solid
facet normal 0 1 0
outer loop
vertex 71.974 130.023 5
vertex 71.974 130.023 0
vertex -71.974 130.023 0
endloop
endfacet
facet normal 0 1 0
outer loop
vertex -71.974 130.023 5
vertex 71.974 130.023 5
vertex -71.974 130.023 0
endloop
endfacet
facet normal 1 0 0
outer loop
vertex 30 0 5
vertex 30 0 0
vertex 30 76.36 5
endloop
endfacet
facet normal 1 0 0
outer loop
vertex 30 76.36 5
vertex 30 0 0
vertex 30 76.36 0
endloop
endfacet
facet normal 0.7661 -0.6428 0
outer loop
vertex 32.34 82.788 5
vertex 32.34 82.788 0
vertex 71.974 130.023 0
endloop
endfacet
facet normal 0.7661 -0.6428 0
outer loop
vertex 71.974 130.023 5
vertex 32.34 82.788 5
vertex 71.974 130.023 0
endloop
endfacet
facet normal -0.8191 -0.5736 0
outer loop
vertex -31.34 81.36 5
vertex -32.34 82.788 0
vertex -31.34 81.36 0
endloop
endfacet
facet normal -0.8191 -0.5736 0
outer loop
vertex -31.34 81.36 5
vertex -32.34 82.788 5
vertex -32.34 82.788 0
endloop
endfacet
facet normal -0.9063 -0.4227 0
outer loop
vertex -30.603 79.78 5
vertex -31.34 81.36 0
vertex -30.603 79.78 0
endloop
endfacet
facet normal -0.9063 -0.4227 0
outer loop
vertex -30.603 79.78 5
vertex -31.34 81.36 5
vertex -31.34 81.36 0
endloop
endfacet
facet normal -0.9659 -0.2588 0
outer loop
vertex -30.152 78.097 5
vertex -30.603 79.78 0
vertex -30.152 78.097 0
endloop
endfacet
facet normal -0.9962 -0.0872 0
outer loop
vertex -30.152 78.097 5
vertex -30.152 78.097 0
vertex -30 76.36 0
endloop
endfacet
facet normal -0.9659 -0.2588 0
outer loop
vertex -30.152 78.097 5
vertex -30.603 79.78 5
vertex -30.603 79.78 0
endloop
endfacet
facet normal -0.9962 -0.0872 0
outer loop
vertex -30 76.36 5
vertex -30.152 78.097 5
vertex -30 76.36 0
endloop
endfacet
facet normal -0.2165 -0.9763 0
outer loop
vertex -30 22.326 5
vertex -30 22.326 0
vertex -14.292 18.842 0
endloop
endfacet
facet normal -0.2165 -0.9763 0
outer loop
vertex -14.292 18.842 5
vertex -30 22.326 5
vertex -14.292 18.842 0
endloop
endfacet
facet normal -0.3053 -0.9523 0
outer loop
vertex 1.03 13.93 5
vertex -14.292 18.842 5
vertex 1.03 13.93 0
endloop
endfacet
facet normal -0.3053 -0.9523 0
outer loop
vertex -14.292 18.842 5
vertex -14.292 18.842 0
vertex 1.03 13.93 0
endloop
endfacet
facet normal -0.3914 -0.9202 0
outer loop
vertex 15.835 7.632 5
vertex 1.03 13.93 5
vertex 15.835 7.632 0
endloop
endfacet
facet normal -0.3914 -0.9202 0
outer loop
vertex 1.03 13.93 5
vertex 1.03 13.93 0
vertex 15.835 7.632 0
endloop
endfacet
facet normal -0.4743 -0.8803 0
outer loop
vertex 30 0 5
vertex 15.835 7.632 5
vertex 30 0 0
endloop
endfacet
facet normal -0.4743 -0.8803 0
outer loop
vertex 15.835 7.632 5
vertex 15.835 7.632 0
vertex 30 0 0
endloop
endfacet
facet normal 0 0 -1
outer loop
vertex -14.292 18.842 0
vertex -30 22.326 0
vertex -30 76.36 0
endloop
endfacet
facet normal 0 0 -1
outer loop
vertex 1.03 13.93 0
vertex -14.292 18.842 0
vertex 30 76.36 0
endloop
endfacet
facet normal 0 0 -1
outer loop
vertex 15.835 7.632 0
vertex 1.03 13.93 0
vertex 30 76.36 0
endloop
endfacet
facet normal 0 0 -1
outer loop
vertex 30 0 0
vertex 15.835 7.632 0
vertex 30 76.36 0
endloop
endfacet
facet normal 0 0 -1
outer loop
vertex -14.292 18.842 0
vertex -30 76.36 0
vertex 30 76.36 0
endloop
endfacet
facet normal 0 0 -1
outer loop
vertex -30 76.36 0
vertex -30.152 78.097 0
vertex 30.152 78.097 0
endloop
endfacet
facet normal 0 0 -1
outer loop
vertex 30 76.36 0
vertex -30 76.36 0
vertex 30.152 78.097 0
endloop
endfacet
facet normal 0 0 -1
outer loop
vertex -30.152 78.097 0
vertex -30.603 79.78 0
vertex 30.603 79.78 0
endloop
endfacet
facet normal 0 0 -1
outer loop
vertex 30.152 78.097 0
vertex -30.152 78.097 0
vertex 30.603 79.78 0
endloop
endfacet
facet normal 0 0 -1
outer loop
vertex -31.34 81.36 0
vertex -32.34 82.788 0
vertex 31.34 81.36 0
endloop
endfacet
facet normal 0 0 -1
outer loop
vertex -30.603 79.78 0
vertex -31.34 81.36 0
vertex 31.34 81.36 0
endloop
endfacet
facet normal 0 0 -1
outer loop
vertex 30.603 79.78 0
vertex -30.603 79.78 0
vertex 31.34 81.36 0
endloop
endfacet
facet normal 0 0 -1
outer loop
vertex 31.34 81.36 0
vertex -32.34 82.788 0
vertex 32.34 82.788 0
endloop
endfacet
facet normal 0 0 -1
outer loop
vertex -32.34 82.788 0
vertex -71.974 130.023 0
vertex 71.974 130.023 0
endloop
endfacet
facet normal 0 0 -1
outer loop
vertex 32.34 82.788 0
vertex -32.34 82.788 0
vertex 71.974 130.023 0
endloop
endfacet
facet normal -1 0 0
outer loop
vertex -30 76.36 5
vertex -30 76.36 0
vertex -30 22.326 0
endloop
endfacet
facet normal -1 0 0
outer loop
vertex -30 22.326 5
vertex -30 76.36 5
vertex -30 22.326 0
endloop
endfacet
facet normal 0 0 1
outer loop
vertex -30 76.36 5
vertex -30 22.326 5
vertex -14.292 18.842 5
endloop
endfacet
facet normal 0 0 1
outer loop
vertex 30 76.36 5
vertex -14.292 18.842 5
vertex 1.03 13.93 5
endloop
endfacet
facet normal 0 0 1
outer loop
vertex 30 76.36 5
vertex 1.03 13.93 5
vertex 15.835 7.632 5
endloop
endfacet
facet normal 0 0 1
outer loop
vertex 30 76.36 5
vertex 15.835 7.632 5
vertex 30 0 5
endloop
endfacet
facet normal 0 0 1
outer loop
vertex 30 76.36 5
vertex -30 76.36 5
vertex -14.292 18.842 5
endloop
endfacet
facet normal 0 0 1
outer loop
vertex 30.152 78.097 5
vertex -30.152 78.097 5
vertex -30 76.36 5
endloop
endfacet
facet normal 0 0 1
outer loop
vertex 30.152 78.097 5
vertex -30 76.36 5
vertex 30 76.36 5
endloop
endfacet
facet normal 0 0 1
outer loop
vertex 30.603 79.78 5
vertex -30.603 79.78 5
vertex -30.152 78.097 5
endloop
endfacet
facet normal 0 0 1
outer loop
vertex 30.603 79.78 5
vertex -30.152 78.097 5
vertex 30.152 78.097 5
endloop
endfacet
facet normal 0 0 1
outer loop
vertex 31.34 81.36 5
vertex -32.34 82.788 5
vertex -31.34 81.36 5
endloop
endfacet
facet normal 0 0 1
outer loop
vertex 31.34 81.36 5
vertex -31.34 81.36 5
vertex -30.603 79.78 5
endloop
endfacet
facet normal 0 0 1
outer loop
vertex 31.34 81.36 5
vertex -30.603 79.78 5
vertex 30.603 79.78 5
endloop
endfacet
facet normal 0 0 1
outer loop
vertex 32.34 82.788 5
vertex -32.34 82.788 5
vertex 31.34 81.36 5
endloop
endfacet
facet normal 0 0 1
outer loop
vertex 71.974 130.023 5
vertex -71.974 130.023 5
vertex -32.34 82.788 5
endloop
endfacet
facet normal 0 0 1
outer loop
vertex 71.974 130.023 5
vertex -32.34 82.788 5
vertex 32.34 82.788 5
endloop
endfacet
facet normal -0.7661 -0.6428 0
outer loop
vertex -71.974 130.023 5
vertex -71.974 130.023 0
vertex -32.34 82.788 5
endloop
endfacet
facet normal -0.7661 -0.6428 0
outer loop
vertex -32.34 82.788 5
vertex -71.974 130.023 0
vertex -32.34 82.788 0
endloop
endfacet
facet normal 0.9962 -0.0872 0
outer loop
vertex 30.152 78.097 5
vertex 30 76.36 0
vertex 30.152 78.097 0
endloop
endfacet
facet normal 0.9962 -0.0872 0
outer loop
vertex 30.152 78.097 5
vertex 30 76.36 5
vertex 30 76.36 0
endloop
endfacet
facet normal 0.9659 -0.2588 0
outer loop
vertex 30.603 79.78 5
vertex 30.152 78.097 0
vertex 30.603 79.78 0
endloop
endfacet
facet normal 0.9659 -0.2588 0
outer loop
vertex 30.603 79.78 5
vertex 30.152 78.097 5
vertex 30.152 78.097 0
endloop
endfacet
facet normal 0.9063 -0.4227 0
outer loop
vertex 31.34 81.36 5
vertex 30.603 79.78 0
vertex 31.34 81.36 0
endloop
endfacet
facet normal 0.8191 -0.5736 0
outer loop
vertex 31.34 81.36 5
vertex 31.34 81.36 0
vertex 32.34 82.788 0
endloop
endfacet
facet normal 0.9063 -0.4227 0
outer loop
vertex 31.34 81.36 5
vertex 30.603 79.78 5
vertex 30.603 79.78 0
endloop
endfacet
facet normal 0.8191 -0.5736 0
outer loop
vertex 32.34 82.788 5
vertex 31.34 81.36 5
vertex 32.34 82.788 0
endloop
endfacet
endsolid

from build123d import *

# Parameters (mm, degrees)
FUNNEL_SIDE_PANEL_DEPTH = 5
FILLET1_R               = 10


with BuildPart() as part:
    # Sketch1 → Funnel - Side Panel (new body)
    with BuildSketch(Plane.XY):
        with BuildLine():
            Line((30, 0), (30, 80))
            Line((30, 80), (71.974030913, 130.022702136))
            Line((71.974030913, 130.022702136), (-71.974030913, 130.022702136))
            Line((-71.974030913, 130.022702136), (-30, 80))
            Line((-30, 80), (-30, 22.326086298))
            ThreePointArc((-30, 22.326086298), (1.02961193, 13.930062634), (30, 0))
        make_face()
    extrude(amount=FUNNEL_SIDE_PANEL_DEPTH)

    # Fillet1
    fillet1_edges = [part.edges().sort_by_distance(p)[0] for p in [
        (-30, 80, 2.5),
        (30, 80, 2.5),
    ]]
    fillet(fillet1_edges, radius=FILLET1_R)


solid = part.part
